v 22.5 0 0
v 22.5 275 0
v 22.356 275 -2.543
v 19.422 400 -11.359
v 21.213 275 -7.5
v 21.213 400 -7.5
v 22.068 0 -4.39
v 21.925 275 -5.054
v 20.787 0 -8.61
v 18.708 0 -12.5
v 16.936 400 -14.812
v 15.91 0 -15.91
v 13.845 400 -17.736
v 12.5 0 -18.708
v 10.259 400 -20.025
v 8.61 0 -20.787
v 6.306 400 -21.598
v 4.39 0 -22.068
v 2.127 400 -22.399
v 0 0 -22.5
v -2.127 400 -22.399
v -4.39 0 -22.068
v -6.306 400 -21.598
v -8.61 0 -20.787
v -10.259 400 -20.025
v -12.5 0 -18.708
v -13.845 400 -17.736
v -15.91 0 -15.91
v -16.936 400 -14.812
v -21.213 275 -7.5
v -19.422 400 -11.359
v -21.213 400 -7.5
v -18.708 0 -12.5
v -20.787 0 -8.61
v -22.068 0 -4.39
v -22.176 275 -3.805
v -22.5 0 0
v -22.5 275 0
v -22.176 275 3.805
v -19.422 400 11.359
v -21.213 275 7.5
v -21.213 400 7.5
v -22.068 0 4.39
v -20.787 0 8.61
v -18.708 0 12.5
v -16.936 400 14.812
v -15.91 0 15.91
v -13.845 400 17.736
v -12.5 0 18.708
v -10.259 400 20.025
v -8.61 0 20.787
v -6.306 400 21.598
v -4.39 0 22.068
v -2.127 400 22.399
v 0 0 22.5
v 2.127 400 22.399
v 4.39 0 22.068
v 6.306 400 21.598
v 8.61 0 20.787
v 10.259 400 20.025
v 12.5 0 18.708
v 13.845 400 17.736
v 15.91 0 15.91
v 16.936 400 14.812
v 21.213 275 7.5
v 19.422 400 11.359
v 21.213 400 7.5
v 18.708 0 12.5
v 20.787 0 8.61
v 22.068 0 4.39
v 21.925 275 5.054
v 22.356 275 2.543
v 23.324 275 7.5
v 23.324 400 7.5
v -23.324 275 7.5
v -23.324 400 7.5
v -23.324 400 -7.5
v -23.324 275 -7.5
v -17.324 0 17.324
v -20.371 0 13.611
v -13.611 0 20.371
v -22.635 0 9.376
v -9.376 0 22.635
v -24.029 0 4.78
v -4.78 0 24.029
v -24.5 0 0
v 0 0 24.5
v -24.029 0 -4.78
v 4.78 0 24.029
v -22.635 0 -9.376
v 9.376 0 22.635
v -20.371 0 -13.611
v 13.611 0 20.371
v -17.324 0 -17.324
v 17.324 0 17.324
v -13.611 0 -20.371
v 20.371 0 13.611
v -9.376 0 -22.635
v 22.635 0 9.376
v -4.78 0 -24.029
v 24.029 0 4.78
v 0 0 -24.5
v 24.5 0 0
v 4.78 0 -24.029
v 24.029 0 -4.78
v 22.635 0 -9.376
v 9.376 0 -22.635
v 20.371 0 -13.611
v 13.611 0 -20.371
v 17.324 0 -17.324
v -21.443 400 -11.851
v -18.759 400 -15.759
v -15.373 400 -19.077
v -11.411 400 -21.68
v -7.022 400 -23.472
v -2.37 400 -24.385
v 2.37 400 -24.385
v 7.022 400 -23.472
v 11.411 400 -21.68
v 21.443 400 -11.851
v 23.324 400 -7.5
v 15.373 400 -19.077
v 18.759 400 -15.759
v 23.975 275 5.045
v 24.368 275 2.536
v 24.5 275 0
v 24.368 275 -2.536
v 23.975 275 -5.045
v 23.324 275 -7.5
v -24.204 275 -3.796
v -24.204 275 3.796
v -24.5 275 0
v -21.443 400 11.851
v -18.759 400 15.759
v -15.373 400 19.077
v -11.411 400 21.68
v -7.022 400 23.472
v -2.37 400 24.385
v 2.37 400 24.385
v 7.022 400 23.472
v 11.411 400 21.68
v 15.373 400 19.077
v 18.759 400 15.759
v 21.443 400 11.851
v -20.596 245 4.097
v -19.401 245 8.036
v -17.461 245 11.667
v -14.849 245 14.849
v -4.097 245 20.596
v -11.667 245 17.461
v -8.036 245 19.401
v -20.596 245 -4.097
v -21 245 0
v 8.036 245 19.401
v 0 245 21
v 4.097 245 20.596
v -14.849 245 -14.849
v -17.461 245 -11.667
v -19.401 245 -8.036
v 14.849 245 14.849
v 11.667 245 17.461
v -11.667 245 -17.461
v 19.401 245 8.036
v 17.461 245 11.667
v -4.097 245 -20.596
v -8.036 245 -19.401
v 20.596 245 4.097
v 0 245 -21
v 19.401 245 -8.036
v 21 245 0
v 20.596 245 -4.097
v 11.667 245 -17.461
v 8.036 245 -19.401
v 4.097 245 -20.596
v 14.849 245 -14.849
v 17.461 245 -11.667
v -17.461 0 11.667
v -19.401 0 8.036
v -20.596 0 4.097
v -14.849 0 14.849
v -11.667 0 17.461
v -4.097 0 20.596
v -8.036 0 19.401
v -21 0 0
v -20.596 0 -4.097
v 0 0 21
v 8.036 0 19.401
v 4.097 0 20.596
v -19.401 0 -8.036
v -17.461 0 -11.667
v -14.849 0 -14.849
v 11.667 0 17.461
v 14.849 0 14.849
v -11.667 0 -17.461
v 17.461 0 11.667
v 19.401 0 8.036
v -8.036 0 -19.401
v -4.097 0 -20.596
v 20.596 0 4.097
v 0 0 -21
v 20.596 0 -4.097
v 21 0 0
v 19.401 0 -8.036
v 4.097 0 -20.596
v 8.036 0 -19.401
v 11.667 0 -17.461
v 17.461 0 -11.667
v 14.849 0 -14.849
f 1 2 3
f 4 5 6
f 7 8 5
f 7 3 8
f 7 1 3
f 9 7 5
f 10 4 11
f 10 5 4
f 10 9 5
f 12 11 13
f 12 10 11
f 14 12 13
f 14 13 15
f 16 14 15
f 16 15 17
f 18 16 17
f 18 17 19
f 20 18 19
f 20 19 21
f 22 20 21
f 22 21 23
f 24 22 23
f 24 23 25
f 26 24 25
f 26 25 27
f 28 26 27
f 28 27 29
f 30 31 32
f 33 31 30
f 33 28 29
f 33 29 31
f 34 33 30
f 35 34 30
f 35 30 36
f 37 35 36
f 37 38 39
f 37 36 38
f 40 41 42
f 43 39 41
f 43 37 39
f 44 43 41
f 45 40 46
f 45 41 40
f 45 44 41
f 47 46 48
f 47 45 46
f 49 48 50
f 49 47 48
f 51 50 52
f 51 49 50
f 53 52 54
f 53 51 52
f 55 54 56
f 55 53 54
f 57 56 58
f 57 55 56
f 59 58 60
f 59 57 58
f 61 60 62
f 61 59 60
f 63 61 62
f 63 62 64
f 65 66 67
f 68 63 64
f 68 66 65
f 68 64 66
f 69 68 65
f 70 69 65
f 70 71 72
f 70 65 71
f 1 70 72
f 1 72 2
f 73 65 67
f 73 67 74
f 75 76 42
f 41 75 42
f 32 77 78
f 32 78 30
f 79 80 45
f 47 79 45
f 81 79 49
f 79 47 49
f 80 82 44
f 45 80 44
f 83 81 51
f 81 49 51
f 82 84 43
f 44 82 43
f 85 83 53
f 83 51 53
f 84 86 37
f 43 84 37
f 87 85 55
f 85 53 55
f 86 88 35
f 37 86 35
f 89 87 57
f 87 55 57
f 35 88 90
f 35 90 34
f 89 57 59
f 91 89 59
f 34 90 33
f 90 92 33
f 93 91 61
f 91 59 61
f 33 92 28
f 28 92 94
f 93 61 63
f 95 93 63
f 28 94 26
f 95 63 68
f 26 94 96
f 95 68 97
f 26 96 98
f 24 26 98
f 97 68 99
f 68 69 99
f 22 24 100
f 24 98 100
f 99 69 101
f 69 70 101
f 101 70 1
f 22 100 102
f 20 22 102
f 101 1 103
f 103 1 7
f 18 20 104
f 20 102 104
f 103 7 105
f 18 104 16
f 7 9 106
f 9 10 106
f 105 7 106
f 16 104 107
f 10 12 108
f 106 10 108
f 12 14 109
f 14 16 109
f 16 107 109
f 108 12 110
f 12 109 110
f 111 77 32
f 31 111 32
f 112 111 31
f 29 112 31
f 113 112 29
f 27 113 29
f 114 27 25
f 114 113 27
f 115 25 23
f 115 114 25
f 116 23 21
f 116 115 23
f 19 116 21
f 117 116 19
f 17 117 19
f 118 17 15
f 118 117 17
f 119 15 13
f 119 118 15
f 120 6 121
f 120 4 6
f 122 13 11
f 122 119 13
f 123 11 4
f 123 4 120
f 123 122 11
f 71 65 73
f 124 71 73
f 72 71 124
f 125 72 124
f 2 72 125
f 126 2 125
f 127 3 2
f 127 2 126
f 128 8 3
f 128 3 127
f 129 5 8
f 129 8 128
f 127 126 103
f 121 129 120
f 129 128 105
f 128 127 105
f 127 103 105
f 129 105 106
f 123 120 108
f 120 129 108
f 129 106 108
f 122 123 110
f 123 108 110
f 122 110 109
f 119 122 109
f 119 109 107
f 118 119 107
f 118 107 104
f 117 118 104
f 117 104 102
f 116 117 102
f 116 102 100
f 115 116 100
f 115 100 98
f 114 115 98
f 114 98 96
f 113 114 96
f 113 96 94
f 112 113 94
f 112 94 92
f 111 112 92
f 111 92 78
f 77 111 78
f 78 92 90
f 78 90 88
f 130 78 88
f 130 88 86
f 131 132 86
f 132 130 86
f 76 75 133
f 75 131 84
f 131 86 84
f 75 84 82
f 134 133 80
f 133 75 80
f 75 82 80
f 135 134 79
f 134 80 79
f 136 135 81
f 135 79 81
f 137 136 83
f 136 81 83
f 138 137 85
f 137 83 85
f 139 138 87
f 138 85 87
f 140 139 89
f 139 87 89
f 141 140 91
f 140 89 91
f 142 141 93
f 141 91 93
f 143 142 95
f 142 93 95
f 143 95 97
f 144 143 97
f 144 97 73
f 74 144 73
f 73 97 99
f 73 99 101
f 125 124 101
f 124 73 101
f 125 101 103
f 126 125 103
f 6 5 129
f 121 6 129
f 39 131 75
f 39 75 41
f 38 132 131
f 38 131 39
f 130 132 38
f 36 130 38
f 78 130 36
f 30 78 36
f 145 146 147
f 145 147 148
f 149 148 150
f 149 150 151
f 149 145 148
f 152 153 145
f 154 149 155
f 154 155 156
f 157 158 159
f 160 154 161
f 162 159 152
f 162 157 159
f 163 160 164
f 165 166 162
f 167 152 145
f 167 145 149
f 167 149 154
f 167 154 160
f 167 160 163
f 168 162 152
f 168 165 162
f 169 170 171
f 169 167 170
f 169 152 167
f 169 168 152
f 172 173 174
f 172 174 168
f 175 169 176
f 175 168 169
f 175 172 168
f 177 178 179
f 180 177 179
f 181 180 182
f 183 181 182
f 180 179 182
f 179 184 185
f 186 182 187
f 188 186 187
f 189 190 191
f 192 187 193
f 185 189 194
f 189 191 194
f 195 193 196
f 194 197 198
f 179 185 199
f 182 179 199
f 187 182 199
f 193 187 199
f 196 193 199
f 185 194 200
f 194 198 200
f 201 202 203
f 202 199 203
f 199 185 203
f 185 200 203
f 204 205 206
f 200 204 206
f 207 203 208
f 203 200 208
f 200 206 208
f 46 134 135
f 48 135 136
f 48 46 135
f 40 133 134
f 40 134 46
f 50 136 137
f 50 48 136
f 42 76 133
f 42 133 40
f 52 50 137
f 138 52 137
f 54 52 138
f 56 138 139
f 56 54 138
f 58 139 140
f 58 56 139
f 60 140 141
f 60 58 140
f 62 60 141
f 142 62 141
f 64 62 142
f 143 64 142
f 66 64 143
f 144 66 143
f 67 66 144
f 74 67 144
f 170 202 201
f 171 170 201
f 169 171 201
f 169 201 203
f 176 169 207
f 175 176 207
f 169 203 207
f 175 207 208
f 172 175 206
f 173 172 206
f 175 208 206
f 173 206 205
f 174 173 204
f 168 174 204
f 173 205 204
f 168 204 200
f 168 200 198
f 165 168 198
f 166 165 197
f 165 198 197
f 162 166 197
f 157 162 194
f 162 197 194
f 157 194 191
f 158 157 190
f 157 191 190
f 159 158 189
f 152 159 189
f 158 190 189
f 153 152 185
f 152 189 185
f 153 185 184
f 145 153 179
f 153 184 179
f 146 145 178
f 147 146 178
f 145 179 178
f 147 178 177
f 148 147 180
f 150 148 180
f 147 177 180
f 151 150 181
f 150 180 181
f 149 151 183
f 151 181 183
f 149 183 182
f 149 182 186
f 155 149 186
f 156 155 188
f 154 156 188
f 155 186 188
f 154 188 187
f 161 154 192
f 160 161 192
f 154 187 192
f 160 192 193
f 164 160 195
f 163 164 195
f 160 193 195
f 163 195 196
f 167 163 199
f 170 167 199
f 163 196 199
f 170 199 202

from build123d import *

# Parameters (mm, degrees)
SKETCH1_R           = 21
BOSS_EXTRUDE1_DEPTH = 245
SKETCH2_R           = 24.5
SKETCH2_R_2         = 22.5
BOSS_EXTRUDE2_DEPTH = 400
SKETCH3_W           = 63
SKETCH3_H           = 15
CUT_EXTRUDE1_DEPTH  = 125


with BuildPart() as part:
    # Sketch1 → Boss-Extrude1 (new body)
    with BuildSketch(Plane(origin=(0, 0, 0), x_dir=(1, 0, 0), z_dir=(0, 1, 0))):
        Circle(SKETCH1_R)
    extrude(amount=BOSS_EXTRUDE1_DEPTH)


with BuildPart() as body_2:
    # Sketch2 → Boss-Extrude2 (new body)
    with BuildSketch(Plane(origin=(0, 0, 0), x_dir=(1, 0, 0), z_dir=(0, 1, 0))):
        Circle(SKETCH2_R)
        Circle(SKETCH2_R_2, mode=Mode.SUBTRACT)
    extrude(amount=BOSS_EXTRUDE2_DEPTH)

    # Sketch3 → Cut-Extrude1 (cut)
    with BuildSketch(Plane(origin=(0, 400, 0), x_dir=(1, 0, 0), z_dir=(0, 1, 0))):
        Rectangle(SKETCH3_W, SKETCH3_H)
    extrude(amount=-CUT_EXTRUDE1_DEPTH, mode=Mode.SUBTRACT)


solid = Compound([part.part, body_2.part])
